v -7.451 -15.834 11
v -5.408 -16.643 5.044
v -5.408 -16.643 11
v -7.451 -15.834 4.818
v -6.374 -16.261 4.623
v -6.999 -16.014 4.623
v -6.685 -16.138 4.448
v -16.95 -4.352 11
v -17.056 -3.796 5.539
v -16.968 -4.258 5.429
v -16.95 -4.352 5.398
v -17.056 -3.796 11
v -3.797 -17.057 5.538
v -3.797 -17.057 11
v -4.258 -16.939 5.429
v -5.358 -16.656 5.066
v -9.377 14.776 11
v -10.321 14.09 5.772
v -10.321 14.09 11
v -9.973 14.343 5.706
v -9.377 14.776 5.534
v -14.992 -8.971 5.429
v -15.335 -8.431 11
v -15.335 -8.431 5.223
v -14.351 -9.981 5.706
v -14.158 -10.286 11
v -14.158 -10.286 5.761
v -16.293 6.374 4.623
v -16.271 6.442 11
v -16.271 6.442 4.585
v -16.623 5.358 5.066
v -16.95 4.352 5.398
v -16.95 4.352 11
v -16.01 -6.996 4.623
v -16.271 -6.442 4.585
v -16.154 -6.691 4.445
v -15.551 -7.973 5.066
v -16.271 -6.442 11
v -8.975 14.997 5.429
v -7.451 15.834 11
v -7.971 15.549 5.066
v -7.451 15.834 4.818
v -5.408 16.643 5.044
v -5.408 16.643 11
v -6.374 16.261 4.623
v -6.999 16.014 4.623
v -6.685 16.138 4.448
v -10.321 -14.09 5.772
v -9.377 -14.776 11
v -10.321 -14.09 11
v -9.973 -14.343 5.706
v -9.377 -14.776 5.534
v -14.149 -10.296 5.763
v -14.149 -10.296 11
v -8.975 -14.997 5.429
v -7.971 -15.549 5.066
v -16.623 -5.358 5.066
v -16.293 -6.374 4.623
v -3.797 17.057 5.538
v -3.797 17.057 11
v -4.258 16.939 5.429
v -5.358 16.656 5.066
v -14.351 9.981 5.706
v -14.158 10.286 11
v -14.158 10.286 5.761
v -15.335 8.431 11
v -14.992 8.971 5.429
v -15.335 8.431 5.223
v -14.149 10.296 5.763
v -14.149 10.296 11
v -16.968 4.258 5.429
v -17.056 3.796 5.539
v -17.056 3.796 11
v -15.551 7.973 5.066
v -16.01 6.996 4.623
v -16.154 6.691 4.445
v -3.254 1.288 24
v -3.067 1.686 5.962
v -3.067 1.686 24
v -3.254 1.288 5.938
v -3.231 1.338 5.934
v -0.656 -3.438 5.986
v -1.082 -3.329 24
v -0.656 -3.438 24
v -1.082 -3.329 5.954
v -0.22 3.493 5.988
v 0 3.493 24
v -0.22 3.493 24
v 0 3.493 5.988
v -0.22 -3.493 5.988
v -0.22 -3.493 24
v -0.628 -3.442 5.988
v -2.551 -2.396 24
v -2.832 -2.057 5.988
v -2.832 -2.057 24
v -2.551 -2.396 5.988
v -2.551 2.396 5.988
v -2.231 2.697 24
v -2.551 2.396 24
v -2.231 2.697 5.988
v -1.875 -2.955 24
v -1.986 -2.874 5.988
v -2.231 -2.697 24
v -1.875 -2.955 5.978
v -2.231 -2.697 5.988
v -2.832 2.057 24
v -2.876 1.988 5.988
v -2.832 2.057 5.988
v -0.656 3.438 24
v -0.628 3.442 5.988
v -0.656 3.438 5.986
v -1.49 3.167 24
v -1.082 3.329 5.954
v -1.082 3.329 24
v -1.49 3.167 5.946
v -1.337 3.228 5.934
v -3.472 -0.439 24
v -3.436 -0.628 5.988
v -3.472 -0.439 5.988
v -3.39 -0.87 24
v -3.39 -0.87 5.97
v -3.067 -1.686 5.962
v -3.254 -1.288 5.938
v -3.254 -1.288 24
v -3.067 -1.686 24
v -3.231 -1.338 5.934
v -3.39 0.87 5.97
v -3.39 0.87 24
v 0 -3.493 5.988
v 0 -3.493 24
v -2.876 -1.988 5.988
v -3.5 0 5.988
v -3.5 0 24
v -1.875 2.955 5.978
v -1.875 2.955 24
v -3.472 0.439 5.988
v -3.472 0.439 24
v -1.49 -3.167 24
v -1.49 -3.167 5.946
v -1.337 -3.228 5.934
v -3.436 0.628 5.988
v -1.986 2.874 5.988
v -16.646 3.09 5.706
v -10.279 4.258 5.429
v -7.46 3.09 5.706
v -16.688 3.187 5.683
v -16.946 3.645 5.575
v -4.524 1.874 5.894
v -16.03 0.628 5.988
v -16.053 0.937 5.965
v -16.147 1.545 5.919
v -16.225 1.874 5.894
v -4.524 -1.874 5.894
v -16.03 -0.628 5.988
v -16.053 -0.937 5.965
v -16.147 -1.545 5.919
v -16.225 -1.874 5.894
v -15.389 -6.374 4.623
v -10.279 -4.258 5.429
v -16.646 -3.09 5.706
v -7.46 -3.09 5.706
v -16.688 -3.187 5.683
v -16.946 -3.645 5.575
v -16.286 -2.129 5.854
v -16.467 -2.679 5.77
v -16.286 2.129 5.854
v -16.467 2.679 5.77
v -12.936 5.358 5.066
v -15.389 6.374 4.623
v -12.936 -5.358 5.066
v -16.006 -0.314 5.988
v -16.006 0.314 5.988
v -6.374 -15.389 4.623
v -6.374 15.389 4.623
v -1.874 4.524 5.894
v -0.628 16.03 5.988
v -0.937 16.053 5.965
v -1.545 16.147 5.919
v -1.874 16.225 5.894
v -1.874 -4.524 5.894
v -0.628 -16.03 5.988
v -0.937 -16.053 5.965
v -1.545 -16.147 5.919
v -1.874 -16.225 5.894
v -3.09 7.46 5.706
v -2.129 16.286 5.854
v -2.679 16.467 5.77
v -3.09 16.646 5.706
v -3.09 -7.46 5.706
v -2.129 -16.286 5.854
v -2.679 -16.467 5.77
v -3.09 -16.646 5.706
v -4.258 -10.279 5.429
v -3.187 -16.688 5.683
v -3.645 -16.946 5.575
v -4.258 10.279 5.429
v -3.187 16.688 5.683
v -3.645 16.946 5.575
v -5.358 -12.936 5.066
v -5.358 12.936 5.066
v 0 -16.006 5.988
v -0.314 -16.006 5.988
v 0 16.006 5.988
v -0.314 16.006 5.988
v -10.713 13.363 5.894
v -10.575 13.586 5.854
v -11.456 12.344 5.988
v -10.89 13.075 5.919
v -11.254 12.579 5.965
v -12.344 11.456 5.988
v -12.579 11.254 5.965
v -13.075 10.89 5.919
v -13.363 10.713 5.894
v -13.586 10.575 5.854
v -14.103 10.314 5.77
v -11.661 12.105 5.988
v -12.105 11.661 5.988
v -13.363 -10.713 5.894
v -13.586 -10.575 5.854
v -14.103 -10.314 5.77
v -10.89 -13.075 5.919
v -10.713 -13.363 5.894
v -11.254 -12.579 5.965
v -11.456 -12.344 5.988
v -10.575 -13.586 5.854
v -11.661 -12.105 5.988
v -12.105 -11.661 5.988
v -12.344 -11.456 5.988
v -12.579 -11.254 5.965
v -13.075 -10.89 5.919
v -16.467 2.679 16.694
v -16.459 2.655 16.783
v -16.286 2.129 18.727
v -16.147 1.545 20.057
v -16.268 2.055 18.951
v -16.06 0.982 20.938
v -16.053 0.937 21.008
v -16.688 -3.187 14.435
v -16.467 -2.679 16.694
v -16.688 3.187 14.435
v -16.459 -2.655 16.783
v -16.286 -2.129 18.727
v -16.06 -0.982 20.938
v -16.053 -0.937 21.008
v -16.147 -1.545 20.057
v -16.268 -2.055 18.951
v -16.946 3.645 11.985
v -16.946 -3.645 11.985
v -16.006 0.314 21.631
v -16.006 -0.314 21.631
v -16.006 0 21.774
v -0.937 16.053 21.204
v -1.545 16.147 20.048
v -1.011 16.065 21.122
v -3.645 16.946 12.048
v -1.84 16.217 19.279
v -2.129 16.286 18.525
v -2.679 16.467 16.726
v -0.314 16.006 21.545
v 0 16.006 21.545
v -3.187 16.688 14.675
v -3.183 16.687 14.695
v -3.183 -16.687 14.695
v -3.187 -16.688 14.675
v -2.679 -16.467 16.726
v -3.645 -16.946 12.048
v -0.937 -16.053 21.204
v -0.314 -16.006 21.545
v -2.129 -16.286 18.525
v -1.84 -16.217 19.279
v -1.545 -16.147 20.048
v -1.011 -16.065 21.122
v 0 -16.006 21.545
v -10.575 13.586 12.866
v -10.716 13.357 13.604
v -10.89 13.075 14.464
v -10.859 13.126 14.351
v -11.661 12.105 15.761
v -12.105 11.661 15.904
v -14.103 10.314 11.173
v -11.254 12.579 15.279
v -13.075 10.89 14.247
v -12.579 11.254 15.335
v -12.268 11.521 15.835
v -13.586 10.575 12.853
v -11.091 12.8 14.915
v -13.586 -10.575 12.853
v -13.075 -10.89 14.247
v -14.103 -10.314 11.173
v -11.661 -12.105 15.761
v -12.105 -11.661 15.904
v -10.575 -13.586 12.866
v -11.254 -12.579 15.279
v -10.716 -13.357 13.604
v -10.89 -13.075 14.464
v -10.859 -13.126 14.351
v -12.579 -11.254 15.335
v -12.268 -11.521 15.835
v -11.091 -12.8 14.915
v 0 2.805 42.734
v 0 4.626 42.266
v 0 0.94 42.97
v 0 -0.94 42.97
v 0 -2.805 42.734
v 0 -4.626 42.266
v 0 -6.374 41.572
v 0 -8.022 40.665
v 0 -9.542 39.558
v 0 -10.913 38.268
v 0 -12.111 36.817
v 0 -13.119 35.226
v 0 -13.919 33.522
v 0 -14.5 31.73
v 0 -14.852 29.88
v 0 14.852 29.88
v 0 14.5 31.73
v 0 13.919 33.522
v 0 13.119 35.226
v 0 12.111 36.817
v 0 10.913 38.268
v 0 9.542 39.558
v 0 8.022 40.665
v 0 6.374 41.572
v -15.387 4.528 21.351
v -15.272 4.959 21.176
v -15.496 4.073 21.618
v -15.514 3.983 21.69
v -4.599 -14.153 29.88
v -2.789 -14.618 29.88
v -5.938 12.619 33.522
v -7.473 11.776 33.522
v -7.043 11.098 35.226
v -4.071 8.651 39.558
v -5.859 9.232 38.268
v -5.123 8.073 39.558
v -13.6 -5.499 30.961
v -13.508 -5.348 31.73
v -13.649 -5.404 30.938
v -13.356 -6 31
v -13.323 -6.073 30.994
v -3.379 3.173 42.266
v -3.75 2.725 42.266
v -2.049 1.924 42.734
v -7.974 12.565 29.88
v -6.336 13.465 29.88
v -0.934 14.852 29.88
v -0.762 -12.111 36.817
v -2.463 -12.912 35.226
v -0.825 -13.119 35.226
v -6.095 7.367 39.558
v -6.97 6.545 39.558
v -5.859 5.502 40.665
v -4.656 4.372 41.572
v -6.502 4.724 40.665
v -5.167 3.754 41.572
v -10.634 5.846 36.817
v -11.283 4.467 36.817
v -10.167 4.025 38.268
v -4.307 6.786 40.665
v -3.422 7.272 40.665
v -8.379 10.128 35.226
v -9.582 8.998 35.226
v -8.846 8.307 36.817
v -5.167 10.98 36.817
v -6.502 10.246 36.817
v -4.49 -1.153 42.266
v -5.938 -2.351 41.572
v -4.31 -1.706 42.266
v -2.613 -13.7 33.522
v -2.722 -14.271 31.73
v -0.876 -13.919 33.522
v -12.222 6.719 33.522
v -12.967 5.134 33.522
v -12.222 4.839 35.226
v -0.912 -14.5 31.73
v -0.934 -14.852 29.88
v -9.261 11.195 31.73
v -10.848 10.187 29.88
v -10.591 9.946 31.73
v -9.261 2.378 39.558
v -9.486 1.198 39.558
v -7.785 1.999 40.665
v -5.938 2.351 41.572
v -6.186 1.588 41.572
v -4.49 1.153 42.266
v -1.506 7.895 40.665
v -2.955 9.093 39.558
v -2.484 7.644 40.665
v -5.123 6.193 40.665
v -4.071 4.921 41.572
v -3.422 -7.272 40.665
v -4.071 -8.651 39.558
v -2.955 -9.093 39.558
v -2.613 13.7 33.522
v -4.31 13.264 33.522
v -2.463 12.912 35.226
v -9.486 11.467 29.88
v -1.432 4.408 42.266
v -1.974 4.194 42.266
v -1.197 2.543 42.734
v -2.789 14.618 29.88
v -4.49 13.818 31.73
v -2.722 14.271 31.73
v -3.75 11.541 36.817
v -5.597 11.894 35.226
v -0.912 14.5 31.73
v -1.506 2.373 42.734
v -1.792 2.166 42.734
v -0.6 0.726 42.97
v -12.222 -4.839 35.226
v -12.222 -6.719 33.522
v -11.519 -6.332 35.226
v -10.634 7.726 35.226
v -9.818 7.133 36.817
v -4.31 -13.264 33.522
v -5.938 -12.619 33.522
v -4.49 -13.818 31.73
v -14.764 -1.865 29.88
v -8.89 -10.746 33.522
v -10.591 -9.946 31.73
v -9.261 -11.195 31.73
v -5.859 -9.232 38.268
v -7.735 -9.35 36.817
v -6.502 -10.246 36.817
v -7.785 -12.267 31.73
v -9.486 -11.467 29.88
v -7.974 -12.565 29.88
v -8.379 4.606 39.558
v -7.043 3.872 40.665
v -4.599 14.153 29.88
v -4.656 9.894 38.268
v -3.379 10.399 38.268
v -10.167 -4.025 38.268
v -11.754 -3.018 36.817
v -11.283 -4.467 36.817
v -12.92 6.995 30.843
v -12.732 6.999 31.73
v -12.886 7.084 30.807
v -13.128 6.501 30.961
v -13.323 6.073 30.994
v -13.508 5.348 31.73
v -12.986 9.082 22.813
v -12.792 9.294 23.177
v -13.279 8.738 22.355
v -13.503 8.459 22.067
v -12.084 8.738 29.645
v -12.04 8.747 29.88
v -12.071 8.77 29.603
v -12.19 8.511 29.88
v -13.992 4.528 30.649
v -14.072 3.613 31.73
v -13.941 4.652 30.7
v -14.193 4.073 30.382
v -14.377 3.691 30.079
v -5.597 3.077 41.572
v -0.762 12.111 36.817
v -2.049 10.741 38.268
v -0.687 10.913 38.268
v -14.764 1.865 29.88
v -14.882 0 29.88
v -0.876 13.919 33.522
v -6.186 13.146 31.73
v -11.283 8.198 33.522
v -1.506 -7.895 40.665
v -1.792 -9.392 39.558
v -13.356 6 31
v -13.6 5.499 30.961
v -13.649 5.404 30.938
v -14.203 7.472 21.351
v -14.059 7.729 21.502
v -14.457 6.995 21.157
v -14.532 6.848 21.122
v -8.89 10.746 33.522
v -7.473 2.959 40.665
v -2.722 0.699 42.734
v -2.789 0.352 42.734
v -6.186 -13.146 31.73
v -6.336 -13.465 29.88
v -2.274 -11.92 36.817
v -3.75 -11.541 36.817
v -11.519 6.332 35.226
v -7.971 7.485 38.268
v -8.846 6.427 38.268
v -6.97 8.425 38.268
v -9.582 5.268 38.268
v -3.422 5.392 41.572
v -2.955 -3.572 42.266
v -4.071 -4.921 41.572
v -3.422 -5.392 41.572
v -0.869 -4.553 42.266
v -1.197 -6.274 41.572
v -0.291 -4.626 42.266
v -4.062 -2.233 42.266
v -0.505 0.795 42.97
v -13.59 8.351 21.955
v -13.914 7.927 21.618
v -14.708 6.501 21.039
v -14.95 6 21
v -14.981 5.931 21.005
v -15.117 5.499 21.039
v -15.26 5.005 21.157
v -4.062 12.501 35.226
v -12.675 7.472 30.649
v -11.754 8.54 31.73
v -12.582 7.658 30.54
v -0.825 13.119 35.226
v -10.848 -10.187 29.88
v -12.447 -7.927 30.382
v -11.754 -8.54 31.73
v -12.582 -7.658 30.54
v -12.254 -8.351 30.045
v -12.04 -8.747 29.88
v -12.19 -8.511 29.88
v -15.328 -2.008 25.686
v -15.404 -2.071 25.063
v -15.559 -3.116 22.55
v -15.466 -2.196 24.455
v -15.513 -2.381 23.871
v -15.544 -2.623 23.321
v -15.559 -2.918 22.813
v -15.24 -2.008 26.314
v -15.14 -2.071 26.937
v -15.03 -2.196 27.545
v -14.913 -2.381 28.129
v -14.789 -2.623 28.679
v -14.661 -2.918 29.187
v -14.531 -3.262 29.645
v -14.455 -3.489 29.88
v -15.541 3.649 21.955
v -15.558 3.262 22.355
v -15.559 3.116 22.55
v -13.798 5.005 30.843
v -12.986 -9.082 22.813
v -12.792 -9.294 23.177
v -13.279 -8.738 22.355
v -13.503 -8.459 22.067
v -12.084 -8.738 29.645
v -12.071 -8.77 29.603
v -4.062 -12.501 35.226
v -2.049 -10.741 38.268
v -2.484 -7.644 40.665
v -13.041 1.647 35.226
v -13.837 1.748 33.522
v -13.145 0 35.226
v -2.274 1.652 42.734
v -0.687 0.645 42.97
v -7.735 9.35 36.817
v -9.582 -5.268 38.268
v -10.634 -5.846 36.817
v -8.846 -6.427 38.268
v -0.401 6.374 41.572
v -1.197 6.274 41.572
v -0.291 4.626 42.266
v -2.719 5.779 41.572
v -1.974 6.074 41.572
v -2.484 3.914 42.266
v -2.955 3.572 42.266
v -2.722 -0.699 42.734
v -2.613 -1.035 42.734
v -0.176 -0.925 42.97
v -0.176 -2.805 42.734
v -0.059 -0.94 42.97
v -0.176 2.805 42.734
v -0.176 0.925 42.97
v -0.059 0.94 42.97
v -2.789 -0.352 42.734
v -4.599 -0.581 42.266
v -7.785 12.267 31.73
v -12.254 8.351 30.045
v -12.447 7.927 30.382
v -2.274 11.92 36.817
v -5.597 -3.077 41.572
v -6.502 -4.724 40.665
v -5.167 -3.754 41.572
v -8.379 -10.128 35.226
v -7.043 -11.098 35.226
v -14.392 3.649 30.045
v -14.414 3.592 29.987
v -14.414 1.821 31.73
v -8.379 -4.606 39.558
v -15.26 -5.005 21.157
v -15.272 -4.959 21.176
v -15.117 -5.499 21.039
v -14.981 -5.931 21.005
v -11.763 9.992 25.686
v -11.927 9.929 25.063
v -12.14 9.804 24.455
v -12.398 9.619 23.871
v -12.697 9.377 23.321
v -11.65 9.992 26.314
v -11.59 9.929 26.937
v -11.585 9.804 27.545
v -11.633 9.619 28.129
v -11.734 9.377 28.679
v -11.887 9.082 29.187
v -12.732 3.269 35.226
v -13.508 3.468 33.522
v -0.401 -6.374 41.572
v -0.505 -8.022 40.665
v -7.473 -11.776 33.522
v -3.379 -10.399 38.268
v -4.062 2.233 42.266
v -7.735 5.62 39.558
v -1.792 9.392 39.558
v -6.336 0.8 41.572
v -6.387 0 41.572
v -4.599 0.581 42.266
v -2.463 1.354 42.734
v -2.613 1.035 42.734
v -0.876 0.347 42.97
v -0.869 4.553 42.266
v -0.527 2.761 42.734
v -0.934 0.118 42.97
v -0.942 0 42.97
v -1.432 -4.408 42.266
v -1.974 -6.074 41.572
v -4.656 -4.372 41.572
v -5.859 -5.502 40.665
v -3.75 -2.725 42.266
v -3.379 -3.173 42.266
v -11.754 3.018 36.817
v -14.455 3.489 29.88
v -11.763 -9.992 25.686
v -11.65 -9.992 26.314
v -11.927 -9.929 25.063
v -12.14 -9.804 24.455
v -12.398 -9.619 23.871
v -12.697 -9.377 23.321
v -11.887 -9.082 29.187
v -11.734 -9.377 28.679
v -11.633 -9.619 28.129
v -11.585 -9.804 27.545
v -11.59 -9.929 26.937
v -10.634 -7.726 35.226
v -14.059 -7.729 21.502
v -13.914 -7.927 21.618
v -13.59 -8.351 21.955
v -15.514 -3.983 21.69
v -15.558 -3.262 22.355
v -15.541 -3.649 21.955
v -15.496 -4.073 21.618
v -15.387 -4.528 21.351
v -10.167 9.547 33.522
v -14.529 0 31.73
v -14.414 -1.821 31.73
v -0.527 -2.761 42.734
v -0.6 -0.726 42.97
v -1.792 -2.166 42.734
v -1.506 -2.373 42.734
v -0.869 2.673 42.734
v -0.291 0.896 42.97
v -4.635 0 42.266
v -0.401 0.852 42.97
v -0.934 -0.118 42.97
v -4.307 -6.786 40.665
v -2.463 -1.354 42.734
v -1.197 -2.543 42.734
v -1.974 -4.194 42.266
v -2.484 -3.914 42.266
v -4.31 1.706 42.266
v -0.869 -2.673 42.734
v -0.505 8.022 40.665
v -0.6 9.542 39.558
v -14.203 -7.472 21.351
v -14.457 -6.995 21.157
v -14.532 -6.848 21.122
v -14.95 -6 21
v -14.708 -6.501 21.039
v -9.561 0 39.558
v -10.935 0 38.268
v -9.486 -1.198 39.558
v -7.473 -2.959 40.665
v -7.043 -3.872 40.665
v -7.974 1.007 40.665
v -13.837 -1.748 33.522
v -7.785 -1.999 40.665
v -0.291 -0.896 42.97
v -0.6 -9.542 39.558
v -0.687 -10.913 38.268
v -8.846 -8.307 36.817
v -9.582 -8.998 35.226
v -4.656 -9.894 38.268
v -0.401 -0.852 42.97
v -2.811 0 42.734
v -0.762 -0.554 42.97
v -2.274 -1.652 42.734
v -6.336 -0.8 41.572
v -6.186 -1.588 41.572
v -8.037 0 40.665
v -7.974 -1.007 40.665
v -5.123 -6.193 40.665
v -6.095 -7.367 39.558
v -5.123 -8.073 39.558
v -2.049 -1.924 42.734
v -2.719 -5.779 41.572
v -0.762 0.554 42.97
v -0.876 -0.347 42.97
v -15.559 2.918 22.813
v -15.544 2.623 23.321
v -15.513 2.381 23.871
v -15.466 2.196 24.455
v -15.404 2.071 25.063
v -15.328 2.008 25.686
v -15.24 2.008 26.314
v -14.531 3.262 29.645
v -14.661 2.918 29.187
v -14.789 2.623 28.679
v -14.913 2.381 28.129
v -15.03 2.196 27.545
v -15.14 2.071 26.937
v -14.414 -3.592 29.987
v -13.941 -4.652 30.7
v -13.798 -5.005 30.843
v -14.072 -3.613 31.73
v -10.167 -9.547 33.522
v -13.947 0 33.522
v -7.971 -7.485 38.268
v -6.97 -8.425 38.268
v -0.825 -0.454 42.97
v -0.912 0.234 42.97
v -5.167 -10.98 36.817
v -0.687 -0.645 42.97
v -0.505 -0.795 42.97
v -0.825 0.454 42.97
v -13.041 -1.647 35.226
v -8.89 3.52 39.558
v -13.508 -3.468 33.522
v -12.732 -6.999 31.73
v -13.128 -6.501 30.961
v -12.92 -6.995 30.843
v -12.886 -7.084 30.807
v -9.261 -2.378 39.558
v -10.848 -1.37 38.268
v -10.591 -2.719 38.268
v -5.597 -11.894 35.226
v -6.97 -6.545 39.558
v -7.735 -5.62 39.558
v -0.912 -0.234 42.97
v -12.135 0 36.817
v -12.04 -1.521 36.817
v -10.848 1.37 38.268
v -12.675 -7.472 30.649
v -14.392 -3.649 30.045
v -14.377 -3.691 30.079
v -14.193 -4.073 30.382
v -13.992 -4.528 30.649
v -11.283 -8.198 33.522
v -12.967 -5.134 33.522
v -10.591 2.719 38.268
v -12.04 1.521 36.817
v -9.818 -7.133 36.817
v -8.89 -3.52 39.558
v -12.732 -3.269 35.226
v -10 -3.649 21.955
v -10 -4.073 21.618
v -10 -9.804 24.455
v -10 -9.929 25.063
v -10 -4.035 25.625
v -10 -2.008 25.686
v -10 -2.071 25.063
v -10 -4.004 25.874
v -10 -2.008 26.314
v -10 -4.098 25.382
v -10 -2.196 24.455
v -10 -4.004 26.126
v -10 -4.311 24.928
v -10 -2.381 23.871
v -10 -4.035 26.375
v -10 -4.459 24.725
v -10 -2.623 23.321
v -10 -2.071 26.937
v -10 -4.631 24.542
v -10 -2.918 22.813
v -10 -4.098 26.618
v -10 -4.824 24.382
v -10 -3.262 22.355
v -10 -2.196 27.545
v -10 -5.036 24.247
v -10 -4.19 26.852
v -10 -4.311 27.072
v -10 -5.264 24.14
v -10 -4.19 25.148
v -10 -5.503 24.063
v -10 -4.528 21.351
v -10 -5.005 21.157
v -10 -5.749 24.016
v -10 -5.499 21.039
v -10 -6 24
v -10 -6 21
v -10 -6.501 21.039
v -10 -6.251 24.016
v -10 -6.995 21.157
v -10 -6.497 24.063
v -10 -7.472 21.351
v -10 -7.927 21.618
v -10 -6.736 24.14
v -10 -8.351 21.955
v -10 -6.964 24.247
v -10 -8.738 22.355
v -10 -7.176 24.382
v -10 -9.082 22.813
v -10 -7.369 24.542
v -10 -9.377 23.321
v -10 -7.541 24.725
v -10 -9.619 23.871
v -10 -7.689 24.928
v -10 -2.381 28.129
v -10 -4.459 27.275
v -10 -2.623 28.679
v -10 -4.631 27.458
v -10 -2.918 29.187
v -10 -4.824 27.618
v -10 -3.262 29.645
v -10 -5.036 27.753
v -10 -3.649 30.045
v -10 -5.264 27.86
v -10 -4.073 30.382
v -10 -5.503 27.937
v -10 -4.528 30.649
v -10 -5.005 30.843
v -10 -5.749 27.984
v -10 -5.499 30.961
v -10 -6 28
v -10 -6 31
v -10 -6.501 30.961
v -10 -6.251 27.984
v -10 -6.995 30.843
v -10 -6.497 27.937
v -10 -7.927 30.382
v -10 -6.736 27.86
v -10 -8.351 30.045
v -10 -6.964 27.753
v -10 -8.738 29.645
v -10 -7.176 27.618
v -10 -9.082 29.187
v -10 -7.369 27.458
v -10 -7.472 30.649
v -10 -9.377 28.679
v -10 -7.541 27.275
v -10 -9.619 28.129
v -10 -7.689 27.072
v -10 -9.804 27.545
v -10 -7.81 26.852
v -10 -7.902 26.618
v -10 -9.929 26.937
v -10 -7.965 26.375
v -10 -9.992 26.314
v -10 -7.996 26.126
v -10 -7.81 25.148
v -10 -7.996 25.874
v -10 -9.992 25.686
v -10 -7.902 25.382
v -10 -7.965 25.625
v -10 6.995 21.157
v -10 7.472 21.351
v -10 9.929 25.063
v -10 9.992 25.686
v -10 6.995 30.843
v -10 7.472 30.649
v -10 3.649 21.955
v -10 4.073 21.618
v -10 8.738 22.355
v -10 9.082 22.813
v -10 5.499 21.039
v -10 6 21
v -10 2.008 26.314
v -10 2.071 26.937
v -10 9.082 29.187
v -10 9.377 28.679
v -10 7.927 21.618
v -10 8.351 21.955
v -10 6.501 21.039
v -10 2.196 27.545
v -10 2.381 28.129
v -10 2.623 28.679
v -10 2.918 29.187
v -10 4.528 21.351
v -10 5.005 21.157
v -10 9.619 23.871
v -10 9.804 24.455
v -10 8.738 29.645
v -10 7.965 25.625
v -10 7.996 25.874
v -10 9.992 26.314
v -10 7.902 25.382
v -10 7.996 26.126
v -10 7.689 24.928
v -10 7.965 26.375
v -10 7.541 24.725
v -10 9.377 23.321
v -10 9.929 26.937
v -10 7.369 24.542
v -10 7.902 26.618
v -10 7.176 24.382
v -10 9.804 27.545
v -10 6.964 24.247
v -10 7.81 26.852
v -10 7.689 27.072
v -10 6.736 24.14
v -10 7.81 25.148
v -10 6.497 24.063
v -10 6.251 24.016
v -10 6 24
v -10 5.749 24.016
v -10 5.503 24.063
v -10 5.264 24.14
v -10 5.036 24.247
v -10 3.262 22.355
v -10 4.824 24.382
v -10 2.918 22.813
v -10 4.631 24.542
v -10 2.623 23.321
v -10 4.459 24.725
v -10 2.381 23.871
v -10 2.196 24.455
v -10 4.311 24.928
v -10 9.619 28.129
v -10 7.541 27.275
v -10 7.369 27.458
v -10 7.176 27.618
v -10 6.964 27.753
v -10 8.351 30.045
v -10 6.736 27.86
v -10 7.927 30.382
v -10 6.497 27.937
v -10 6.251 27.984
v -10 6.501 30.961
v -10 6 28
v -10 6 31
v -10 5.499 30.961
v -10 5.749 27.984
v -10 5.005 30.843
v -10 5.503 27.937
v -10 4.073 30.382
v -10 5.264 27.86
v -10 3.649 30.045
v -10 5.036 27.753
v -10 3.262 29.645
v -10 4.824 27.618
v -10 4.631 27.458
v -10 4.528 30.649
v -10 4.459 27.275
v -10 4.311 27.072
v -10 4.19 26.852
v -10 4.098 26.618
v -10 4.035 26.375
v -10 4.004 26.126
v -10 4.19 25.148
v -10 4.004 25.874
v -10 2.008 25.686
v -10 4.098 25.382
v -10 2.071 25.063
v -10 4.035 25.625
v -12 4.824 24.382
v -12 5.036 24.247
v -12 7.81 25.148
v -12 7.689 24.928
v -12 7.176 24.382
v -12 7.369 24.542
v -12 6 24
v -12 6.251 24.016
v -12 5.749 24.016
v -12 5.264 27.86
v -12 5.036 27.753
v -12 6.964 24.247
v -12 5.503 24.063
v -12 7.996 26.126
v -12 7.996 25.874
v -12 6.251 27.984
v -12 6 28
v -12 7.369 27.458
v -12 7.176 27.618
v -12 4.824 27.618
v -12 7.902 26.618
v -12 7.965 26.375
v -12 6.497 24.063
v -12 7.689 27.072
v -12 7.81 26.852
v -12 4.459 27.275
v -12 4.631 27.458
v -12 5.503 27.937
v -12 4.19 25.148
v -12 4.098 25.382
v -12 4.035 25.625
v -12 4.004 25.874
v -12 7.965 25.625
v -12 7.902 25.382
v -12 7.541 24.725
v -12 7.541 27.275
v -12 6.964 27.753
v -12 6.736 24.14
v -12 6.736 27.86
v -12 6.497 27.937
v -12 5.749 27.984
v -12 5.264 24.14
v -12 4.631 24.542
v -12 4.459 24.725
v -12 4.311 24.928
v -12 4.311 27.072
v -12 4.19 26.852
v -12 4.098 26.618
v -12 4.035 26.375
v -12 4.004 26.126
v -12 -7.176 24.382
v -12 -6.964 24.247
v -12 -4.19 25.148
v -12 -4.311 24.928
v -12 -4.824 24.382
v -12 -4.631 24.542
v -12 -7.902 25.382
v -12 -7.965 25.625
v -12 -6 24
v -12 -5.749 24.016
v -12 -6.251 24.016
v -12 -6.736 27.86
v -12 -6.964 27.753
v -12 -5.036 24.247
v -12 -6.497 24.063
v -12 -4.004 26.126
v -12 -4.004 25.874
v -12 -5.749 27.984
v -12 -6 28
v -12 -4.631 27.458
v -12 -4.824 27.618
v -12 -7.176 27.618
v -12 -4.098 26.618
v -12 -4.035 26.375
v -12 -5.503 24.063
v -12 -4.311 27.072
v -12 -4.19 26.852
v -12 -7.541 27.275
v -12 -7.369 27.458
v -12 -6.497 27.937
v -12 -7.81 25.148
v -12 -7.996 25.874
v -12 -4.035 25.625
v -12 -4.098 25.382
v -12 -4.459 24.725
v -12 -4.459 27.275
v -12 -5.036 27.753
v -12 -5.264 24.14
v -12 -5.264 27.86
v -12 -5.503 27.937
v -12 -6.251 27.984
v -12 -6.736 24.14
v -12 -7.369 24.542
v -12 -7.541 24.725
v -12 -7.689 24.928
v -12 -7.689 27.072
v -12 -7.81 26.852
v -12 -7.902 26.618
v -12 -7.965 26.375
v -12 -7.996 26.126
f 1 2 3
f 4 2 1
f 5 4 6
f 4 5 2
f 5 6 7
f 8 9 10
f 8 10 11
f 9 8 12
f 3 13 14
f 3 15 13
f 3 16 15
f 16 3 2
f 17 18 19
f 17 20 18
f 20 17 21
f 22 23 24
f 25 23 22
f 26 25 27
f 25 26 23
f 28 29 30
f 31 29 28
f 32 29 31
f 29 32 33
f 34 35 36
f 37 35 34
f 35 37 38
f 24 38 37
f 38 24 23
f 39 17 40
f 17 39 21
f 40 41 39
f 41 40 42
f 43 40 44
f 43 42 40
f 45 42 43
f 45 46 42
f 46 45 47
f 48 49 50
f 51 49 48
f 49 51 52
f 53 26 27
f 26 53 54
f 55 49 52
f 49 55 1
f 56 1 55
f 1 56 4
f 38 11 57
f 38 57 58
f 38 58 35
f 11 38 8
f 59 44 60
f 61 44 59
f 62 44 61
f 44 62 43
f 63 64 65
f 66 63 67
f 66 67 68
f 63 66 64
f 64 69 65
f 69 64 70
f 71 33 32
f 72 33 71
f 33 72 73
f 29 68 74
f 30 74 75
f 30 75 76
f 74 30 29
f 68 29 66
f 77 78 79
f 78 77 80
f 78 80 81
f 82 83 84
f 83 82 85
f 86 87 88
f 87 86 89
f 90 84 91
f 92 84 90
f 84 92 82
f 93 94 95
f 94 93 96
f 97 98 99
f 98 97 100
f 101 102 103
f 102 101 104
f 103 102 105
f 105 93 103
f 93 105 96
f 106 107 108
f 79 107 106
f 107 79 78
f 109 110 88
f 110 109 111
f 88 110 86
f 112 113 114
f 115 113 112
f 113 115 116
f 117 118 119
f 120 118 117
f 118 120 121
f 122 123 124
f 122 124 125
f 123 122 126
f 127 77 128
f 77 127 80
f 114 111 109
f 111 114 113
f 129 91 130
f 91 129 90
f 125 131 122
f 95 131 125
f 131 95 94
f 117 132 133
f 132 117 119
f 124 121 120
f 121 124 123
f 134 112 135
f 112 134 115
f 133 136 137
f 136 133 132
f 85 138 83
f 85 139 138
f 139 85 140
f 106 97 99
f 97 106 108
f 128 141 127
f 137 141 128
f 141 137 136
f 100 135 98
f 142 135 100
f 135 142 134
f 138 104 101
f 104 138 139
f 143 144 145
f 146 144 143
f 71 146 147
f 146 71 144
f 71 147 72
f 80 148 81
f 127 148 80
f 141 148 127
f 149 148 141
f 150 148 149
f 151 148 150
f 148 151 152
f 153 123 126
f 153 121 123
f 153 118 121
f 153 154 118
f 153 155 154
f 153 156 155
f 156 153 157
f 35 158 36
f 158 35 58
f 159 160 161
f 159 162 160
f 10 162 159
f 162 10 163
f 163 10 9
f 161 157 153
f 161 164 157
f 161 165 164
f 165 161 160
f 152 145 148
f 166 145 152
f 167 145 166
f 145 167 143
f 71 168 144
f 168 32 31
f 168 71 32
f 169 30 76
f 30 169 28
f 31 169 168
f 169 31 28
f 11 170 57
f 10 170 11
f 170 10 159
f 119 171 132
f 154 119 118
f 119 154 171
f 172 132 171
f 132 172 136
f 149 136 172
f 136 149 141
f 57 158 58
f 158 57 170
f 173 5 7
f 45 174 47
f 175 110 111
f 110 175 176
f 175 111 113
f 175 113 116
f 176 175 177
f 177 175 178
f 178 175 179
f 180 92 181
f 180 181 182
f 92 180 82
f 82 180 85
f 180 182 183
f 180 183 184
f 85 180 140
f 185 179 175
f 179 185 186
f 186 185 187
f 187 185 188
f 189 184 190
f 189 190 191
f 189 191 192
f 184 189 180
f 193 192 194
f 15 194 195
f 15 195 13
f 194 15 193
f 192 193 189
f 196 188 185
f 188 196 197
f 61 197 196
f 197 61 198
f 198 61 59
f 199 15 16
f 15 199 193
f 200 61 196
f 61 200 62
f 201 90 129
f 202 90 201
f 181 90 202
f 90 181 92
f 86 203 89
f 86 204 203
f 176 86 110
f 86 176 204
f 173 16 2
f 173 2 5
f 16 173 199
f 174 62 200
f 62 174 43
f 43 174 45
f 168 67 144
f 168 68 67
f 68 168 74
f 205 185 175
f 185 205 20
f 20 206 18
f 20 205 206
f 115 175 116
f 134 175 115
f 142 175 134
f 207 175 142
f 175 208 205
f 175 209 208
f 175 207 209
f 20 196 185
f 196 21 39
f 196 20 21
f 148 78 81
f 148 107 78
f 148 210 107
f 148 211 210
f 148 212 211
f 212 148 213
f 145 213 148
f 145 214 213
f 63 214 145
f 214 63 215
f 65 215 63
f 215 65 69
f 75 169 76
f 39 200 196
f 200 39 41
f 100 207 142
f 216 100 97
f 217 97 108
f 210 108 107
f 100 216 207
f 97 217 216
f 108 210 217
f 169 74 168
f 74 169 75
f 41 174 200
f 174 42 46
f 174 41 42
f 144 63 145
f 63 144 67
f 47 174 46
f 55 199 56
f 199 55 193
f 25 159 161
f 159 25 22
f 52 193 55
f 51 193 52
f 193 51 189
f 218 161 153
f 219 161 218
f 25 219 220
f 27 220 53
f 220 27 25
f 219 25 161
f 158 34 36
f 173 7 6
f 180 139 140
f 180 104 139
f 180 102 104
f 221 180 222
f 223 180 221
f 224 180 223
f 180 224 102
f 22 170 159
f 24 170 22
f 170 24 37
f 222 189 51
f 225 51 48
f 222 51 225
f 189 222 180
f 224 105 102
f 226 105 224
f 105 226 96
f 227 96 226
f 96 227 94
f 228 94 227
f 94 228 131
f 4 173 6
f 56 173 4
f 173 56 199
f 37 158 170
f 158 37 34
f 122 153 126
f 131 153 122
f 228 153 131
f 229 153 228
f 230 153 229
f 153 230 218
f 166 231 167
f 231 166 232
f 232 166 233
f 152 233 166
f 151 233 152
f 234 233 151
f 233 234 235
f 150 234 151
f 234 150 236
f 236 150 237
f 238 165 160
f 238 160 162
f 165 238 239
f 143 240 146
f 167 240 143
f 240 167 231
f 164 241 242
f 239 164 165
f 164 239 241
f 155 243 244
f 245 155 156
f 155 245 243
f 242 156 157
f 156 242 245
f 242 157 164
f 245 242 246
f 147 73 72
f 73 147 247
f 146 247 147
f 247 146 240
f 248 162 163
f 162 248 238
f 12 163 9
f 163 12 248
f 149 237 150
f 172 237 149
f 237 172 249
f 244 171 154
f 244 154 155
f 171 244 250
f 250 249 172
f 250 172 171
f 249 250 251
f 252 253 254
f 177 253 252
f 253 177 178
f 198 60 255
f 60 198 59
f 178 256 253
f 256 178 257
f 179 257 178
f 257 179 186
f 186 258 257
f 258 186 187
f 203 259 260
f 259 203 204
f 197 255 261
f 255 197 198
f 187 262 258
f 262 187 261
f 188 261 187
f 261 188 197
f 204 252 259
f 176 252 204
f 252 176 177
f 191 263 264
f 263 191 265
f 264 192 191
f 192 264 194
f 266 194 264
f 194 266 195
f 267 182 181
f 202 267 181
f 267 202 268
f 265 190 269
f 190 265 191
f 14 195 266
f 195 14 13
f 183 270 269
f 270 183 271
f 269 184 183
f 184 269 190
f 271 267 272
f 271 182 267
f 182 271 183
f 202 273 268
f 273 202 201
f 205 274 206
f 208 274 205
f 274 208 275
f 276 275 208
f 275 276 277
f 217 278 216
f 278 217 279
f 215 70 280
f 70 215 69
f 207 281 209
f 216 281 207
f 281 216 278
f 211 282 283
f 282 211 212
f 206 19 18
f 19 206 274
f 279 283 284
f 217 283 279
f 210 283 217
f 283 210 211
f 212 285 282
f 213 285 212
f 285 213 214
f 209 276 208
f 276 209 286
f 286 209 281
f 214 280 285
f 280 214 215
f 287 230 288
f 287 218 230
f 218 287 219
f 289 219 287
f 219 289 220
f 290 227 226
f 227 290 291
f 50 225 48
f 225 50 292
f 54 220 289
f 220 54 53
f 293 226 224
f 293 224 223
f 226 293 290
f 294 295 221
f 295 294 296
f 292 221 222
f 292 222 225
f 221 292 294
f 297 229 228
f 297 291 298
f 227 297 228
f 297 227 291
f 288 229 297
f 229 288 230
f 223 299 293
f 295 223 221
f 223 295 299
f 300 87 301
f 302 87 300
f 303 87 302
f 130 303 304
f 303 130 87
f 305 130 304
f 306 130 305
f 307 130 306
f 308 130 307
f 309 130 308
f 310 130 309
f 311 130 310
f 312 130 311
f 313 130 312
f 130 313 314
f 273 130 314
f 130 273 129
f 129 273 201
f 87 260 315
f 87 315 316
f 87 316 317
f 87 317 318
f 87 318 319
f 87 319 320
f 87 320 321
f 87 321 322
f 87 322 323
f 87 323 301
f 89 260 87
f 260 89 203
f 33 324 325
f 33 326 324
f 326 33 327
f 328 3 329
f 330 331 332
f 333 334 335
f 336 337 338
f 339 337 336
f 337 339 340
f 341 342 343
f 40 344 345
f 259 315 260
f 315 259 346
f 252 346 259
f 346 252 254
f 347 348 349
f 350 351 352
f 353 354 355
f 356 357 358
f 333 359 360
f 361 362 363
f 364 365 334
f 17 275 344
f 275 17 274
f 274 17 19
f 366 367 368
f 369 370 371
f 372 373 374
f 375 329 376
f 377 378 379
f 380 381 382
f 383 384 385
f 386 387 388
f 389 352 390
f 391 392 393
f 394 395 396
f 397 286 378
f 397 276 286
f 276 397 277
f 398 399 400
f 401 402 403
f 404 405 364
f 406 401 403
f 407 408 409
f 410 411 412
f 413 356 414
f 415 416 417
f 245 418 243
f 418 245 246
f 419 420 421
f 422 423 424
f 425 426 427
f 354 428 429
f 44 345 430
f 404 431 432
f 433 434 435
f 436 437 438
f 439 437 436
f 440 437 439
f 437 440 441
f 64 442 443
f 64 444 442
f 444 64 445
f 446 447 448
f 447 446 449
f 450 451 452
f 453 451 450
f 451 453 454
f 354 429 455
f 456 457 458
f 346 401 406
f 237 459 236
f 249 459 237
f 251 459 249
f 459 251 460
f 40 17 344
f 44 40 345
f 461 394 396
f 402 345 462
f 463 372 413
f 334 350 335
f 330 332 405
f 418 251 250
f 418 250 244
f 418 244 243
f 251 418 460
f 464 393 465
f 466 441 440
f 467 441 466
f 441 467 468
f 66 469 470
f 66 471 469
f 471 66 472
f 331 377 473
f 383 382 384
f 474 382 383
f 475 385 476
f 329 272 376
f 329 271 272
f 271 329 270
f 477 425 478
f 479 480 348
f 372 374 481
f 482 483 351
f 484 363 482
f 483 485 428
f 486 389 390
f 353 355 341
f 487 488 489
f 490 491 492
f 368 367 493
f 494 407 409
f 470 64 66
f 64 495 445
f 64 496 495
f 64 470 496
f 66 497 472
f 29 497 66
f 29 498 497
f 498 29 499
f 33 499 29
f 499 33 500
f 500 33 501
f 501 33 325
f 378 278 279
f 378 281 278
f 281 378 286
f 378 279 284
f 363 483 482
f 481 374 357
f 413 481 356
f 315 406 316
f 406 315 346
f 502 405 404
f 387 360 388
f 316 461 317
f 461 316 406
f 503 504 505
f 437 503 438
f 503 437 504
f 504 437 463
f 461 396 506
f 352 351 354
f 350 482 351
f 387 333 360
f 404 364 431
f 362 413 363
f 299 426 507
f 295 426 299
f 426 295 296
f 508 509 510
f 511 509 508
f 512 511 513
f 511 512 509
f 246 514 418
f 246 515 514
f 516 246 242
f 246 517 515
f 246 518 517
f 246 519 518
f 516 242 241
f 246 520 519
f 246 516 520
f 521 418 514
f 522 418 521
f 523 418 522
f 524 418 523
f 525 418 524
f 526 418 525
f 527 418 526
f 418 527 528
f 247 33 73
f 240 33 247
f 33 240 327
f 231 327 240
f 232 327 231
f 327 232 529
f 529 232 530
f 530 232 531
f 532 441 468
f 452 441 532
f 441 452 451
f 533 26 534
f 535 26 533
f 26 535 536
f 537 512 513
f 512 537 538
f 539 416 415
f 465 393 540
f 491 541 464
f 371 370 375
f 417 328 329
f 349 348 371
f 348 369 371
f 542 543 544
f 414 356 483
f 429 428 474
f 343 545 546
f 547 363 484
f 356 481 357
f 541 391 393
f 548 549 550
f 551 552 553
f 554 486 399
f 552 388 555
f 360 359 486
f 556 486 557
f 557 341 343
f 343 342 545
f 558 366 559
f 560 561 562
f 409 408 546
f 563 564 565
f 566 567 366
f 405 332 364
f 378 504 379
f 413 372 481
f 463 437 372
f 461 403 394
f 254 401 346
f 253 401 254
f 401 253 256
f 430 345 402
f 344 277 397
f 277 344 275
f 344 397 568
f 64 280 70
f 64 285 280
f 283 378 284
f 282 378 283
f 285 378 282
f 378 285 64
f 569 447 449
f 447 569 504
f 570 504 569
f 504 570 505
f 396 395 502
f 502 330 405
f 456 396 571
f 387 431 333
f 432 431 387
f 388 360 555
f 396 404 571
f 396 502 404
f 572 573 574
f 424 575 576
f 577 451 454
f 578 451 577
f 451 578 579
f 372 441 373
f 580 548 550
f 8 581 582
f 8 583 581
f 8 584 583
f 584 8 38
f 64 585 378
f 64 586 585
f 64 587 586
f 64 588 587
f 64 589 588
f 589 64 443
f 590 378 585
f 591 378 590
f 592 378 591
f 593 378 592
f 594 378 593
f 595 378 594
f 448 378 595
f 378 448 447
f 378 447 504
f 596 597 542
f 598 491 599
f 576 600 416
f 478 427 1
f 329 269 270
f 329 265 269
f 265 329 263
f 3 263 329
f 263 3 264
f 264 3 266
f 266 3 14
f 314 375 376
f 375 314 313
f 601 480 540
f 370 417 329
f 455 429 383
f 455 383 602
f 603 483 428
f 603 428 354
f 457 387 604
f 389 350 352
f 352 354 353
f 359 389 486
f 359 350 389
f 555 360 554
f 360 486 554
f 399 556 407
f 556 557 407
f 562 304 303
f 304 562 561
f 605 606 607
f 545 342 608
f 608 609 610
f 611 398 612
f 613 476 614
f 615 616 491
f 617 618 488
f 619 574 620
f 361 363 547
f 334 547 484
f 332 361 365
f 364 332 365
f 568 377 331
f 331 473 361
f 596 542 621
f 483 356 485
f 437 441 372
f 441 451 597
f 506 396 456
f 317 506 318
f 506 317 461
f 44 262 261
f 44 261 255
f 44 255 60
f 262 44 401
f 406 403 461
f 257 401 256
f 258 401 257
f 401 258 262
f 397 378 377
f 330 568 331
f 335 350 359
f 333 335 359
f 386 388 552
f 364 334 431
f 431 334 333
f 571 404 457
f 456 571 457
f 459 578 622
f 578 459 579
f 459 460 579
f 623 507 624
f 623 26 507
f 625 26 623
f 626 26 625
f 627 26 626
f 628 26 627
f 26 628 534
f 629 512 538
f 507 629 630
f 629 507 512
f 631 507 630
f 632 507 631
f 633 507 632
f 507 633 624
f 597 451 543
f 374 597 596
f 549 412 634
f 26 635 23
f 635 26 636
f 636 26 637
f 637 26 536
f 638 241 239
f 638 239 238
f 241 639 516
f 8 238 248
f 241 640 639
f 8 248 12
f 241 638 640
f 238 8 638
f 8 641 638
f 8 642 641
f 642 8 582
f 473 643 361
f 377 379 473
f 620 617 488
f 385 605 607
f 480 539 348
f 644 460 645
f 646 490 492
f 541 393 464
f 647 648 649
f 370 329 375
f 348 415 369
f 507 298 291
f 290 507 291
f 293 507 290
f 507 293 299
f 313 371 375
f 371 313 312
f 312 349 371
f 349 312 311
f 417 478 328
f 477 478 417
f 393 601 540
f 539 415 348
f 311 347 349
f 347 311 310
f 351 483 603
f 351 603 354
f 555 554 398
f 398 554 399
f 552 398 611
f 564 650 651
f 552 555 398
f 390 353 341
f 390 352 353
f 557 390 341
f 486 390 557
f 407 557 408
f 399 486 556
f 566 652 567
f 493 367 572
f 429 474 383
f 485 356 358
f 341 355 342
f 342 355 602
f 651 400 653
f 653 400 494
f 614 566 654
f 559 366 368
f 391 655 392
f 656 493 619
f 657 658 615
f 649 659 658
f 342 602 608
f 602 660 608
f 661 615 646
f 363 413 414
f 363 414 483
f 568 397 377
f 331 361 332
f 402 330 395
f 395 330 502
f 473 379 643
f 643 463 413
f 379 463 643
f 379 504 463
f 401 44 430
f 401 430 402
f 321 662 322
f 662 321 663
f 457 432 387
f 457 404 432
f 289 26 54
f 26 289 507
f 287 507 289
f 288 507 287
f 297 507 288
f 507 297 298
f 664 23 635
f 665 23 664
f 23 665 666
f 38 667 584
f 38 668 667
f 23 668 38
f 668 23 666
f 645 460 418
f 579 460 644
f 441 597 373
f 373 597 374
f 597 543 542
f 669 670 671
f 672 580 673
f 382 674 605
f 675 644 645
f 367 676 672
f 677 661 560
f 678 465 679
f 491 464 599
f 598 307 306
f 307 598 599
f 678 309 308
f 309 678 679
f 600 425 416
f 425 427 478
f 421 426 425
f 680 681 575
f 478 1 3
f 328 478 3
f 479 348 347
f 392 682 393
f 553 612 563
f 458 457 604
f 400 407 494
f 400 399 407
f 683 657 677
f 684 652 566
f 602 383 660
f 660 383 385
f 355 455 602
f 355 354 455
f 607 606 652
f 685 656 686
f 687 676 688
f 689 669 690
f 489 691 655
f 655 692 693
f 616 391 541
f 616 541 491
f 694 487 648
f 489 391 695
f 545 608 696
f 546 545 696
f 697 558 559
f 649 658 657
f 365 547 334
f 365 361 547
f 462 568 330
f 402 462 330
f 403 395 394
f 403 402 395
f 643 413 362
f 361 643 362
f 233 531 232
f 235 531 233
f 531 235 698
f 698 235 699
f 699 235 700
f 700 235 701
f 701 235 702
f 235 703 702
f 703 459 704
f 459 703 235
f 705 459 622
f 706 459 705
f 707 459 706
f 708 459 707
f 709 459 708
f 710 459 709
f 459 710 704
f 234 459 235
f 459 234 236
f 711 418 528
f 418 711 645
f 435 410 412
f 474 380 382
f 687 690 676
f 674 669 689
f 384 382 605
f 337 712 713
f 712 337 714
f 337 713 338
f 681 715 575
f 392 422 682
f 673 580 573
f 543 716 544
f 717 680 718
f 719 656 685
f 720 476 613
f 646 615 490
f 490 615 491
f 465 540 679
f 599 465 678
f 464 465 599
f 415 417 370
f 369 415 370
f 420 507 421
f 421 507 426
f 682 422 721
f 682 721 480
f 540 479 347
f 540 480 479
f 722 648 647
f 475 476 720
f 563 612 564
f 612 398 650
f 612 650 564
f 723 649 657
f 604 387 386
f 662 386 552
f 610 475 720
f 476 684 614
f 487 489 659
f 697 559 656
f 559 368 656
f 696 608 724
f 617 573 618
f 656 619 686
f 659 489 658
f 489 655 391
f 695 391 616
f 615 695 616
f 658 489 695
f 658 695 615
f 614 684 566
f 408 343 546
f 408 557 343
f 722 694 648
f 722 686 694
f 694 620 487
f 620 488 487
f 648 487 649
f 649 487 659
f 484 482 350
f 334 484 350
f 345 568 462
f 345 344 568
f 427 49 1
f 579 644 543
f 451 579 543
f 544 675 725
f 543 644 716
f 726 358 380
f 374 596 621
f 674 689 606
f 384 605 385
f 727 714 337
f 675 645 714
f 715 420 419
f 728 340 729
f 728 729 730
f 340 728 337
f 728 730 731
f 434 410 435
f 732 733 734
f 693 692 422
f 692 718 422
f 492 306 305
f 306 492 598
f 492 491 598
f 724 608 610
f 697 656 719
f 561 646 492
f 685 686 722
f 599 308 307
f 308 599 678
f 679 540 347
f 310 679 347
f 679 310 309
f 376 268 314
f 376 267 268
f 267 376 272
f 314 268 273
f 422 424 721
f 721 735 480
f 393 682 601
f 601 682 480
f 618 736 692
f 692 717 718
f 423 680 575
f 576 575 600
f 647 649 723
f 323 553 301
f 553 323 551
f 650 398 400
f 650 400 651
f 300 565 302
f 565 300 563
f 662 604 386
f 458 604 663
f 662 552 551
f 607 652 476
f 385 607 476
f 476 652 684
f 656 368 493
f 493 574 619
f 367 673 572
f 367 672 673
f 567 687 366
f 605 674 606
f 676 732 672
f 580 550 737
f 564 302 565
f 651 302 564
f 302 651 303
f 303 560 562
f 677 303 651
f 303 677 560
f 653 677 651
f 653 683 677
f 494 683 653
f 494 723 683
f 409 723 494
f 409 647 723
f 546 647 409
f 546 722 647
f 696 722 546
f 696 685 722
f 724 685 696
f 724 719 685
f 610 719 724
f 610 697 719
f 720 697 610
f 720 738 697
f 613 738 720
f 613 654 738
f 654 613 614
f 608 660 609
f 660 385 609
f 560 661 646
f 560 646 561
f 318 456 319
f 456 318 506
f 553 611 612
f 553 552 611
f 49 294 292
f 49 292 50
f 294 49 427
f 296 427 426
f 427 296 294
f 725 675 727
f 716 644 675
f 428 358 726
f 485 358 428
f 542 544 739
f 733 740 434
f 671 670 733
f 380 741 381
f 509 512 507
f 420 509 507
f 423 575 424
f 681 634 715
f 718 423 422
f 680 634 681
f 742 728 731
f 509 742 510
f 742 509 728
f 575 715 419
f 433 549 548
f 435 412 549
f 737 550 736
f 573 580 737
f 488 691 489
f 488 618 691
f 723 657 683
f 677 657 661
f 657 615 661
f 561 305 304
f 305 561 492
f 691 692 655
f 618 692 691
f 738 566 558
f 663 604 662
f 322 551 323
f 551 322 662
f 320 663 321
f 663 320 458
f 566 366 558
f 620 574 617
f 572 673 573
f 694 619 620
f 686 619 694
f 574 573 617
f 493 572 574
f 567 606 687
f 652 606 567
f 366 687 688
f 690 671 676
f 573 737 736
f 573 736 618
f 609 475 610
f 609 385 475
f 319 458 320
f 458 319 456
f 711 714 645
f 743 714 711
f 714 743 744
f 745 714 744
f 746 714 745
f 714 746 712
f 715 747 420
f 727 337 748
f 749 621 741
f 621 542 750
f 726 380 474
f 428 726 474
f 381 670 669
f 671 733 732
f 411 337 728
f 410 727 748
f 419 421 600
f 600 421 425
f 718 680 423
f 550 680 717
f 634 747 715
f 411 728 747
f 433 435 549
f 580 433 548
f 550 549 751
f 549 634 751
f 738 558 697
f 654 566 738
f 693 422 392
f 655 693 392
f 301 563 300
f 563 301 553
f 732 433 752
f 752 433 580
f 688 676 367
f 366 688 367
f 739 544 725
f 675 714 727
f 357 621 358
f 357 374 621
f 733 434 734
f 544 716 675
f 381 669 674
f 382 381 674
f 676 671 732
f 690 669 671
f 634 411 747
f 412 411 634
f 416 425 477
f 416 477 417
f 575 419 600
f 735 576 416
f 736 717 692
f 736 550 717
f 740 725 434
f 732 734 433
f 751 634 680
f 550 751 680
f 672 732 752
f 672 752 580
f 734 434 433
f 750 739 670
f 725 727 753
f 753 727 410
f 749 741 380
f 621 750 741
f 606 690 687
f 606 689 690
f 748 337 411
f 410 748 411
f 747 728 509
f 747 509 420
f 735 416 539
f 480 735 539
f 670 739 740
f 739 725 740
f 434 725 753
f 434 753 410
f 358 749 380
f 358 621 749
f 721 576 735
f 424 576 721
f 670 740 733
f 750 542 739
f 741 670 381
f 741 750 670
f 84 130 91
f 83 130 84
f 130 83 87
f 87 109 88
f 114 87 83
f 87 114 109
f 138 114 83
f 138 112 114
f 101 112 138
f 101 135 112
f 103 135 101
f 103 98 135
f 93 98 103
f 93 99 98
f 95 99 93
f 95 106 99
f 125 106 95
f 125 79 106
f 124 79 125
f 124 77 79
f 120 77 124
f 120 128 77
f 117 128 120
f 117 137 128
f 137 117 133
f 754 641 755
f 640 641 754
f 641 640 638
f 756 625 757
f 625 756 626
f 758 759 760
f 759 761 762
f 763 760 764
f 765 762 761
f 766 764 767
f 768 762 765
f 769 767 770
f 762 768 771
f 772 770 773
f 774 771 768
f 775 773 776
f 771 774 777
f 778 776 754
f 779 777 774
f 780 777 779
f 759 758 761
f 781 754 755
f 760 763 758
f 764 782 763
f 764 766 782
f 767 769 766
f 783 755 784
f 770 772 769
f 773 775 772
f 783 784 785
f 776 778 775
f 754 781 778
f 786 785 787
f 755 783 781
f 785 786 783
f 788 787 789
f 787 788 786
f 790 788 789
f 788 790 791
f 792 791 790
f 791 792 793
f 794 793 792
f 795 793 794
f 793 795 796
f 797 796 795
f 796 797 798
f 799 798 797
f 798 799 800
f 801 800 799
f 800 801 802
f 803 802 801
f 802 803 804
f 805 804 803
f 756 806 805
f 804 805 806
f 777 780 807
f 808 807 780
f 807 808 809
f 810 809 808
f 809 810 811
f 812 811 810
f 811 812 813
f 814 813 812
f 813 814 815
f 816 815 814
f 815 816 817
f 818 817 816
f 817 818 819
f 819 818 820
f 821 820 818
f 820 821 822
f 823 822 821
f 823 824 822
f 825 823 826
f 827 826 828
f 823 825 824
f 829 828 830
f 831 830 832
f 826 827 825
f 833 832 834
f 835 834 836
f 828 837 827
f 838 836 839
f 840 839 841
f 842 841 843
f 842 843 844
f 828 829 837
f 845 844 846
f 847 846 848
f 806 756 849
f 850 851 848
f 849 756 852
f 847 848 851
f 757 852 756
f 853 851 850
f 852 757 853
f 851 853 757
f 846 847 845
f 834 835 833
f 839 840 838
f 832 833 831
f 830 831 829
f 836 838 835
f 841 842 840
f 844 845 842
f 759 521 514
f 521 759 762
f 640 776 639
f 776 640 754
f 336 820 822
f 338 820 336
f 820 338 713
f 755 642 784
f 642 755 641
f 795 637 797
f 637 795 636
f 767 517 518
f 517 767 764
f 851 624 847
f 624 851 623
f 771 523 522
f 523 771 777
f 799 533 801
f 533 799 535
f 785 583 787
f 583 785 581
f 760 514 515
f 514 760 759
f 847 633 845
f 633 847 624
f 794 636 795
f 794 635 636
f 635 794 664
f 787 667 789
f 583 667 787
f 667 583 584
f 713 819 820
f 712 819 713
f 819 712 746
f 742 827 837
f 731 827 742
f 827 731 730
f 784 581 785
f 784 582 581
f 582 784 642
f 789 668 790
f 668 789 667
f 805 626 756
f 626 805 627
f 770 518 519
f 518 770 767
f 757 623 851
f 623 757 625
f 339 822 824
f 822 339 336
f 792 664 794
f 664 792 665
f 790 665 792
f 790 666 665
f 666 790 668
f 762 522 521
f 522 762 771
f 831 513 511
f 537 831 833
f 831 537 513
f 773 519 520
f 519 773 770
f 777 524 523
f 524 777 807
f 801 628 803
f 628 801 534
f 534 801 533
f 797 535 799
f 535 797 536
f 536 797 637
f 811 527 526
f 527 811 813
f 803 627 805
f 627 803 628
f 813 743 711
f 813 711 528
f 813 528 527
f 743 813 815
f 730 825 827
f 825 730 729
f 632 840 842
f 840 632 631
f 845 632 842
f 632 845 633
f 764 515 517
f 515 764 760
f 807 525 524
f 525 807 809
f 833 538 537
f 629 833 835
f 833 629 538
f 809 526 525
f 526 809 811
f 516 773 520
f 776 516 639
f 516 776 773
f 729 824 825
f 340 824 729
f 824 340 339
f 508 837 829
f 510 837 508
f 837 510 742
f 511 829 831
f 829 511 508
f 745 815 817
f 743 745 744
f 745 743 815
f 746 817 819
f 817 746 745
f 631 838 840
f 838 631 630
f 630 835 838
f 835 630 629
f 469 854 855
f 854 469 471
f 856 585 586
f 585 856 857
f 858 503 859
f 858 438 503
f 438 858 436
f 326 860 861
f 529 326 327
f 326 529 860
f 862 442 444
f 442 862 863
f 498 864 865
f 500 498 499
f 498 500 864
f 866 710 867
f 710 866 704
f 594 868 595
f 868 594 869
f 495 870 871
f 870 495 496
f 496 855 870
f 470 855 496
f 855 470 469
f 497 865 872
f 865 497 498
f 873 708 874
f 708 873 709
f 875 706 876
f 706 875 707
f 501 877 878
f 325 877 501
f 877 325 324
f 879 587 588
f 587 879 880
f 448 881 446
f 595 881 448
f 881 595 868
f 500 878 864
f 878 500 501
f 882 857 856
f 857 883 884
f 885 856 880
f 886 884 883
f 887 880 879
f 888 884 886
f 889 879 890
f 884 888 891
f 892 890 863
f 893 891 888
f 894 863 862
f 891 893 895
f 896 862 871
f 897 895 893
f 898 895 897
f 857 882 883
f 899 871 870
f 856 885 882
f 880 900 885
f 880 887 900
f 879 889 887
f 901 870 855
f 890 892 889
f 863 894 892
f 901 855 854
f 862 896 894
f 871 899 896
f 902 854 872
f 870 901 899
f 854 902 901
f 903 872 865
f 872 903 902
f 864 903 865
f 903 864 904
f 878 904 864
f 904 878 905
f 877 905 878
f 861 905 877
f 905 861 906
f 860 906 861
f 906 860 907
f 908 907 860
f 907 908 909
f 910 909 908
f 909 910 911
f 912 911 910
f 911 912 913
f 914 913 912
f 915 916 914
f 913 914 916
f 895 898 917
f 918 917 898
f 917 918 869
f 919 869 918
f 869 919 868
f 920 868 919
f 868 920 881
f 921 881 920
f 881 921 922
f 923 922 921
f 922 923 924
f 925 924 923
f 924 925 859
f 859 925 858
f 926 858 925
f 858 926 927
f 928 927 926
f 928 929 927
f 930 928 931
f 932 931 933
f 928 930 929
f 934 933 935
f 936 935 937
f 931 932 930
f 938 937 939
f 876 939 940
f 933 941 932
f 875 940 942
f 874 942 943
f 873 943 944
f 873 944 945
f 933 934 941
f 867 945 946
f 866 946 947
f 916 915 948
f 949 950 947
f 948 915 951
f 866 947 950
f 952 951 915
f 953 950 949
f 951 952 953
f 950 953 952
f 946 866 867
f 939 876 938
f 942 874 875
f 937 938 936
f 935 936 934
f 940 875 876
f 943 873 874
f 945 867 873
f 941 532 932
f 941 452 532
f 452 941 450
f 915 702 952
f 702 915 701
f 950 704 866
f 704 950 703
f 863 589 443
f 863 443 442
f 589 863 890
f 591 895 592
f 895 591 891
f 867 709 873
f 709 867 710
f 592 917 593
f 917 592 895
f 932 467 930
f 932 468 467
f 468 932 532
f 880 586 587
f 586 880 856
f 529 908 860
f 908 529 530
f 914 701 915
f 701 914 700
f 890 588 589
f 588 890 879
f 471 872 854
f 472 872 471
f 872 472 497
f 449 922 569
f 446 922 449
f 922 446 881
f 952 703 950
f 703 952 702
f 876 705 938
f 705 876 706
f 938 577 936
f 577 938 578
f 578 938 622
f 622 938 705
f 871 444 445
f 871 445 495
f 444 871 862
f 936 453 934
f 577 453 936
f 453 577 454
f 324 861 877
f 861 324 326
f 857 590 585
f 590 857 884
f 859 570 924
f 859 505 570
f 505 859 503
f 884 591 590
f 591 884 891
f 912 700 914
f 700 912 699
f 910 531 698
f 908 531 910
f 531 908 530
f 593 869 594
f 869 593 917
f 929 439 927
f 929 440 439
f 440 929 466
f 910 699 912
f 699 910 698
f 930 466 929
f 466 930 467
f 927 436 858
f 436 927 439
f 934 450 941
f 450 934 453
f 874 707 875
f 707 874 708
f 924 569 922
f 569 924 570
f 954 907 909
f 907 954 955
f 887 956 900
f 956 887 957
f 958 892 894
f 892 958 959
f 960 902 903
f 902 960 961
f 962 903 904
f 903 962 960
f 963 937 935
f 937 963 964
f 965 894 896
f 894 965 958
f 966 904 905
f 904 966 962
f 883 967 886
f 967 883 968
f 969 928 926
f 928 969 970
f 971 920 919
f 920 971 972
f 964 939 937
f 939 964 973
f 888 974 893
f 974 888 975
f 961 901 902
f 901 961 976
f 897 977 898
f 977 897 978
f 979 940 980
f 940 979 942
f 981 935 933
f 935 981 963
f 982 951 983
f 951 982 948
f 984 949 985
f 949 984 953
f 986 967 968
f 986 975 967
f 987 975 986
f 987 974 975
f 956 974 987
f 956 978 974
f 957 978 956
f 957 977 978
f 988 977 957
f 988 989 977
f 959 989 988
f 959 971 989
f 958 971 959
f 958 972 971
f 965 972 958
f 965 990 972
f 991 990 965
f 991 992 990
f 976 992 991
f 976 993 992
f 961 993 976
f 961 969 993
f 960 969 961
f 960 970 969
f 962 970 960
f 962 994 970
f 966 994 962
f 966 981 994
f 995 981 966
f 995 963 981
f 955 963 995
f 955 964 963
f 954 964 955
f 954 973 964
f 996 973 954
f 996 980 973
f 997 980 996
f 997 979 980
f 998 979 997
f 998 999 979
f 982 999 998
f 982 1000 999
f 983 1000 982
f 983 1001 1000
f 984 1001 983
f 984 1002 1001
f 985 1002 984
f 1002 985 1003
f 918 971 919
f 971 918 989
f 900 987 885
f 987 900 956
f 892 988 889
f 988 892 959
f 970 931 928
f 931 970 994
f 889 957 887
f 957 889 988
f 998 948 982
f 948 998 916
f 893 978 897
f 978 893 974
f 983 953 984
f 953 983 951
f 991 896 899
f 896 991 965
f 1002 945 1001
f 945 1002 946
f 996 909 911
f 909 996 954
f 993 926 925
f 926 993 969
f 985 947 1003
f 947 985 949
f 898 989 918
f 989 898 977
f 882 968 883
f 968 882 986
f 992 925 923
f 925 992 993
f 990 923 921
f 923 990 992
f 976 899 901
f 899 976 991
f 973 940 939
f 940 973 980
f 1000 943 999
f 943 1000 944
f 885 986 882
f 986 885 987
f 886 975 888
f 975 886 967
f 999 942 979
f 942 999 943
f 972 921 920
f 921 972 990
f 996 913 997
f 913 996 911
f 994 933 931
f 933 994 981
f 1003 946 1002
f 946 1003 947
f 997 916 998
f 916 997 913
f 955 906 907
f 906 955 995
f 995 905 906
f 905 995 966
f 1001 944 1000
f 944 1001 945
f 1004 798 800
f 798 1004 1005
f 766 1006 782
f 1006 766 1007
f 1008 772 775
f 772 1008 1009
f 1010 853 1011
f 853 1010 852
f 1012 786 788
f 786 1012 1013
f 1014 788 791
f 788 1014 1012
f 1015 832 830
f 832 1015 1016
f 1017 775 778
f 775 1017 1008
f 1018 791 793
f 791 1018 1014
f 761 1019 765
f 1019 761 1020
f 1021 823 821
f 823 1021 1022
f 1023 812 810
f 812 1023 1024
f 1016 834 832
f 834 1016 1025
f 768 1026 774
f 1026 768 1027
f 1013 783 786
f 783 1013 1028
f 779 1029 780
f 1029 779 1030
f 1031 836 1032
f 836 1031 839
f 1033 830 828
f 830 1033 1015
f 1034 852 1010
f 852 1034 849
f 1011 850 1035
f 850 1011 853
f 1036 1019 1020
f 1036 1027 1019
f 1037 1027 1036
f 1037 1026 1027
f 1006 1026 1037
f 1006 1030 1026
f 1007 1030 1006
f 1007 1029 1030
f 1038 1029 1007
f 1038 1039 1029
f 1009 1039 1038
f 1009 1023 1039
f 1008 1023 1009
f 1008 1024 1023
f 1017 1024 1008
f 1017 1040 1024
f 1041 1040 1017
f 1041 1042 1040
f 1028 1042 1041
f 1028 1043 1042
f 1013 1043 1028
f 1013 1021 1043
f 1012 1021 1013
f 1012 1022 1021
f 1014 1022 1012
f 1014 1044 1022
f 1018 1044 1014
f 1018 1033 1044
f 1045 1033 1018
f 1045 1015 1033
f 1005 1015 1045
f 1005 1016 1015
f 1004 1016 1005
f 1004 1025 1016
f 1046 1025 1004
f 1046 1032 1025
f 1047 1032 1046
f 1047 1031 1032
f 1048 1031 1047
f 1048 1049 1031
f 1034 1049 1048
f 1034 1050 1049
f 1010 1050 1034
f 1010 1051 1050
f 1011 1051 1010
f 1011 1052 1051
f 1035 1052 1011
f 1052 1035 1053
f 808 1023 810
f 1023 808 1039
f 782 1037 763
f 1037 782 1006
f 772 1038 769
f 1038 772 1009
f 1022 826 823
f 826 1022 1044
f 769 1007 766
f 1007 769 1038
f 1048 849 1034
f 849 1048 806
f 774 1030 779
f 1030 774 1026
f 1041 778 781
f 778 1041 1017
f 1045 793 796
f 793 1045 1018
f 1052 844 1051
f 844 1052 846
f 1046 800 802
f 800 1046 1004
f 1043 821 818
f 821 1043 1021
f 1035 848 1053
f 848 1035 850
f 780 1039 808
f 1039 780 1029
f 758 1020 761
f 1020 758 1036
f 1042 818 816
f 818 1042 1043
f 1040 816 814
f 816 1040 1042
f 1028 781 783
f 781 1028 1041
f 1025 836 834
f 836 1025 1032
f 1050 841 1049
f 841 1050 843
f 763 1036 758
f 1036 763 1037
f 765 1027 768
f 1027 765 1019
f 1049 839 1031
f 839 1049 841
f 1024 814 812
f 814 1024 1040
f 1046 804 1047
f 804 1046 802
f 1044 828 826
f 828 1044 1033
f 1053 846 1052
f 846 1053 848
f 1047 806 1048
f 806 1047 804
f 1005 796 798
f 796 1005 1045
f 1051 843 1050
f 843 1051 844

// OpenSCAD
$fn=50;

difference()
	{
	cylinder(d=35,h=10);
	translate([0,0,-1]) cylinder(d=7,h=20);
	translate([-35,0,0]) rotate([90,0,90]) scale([1,0.6,1]) cylinder(d=20,h=70);
	translate([0,35,0]) rotate([90,0,0]) scale([1,0.6,1]) cylinder(d=20,h=70);
	translate([-25,25,0]) rotate([90,0,45]) scale([1,0.6,1]) cylinder(d=20,h=70);
	translate([-25,-25,0]) rotate([90,0,135]) scale([1,0.6,1]) cylinder(d=20,h=70);

  translate([-19,0,0]) rotate([0,0,90]) scale([1,0.6,1]) cylinder(d=10,h=70);
  translate([0,19,0]) rotate([0,0,0]) scale([1,0.6,1]) cylinder(d=10,h=70);
  translate([0,-19,0]) rotate([0,0,0]) scale([1,0.6,1]) cylinder(d=10,h=70);
  translate([-14,14,0]) rotate([0,0,45]) scale([1,0.6,1]) cylinder(d=10,h=70);
  translate([-14,-14,0]) rotate([0,0,135]) scale([1,0.6,1]) cylinder(d=10,h=70);
  translate ([0,-25,0])cube (50);
	}

difference()
{
  hull()
	{
	translate([0,0,10]) cylinder(d=35,h=1);
	translate([0,0,28])sphere(d=30);
	}
  translate ([0,-25,0])cube (50);
  translate([0,0,-1]) cylinder(d=7,h=25);
  translate([-20,-6,26]) rotate([0,90,0]) scale([1,0.8,1]) cylinder(d=10,h=10);
  translate([-20,6,26]) rotate([0,90,0]) scale([1,0.8,1]) cylinder(d=10,h=10);

  translate([-19,0,0]) rotate([0,0,90]) scale([1,0.6,1]) cylinder(d=10,h=70);
  translate([0,19,0]) rotate([0,0,0]) scale([1,0.6,1]) cylinder(d=10,h=70);
  translate([0,-19,0]) rotate([0,0,0]) scale([1,0.6,1]) cylinder(d=10,h=70);
  translate([-14,14,0]) rotate([0,0,45]) scale([1,0.6,1]) cylinder(d=10,h=70);
  translate([-14,-14,0]) rotate([0,0,135]) scale([1,0.6,1]) cylinder(d=10,h=70);
}

translate([-12,6,26]) rotate([0,90,0])  cylinder(d=4,h=10);
translate([-12,-6,26]) rotate([0,90,0])  cylinder(d=4,h=10);


//translate ([0,-25,0])cube (50);
